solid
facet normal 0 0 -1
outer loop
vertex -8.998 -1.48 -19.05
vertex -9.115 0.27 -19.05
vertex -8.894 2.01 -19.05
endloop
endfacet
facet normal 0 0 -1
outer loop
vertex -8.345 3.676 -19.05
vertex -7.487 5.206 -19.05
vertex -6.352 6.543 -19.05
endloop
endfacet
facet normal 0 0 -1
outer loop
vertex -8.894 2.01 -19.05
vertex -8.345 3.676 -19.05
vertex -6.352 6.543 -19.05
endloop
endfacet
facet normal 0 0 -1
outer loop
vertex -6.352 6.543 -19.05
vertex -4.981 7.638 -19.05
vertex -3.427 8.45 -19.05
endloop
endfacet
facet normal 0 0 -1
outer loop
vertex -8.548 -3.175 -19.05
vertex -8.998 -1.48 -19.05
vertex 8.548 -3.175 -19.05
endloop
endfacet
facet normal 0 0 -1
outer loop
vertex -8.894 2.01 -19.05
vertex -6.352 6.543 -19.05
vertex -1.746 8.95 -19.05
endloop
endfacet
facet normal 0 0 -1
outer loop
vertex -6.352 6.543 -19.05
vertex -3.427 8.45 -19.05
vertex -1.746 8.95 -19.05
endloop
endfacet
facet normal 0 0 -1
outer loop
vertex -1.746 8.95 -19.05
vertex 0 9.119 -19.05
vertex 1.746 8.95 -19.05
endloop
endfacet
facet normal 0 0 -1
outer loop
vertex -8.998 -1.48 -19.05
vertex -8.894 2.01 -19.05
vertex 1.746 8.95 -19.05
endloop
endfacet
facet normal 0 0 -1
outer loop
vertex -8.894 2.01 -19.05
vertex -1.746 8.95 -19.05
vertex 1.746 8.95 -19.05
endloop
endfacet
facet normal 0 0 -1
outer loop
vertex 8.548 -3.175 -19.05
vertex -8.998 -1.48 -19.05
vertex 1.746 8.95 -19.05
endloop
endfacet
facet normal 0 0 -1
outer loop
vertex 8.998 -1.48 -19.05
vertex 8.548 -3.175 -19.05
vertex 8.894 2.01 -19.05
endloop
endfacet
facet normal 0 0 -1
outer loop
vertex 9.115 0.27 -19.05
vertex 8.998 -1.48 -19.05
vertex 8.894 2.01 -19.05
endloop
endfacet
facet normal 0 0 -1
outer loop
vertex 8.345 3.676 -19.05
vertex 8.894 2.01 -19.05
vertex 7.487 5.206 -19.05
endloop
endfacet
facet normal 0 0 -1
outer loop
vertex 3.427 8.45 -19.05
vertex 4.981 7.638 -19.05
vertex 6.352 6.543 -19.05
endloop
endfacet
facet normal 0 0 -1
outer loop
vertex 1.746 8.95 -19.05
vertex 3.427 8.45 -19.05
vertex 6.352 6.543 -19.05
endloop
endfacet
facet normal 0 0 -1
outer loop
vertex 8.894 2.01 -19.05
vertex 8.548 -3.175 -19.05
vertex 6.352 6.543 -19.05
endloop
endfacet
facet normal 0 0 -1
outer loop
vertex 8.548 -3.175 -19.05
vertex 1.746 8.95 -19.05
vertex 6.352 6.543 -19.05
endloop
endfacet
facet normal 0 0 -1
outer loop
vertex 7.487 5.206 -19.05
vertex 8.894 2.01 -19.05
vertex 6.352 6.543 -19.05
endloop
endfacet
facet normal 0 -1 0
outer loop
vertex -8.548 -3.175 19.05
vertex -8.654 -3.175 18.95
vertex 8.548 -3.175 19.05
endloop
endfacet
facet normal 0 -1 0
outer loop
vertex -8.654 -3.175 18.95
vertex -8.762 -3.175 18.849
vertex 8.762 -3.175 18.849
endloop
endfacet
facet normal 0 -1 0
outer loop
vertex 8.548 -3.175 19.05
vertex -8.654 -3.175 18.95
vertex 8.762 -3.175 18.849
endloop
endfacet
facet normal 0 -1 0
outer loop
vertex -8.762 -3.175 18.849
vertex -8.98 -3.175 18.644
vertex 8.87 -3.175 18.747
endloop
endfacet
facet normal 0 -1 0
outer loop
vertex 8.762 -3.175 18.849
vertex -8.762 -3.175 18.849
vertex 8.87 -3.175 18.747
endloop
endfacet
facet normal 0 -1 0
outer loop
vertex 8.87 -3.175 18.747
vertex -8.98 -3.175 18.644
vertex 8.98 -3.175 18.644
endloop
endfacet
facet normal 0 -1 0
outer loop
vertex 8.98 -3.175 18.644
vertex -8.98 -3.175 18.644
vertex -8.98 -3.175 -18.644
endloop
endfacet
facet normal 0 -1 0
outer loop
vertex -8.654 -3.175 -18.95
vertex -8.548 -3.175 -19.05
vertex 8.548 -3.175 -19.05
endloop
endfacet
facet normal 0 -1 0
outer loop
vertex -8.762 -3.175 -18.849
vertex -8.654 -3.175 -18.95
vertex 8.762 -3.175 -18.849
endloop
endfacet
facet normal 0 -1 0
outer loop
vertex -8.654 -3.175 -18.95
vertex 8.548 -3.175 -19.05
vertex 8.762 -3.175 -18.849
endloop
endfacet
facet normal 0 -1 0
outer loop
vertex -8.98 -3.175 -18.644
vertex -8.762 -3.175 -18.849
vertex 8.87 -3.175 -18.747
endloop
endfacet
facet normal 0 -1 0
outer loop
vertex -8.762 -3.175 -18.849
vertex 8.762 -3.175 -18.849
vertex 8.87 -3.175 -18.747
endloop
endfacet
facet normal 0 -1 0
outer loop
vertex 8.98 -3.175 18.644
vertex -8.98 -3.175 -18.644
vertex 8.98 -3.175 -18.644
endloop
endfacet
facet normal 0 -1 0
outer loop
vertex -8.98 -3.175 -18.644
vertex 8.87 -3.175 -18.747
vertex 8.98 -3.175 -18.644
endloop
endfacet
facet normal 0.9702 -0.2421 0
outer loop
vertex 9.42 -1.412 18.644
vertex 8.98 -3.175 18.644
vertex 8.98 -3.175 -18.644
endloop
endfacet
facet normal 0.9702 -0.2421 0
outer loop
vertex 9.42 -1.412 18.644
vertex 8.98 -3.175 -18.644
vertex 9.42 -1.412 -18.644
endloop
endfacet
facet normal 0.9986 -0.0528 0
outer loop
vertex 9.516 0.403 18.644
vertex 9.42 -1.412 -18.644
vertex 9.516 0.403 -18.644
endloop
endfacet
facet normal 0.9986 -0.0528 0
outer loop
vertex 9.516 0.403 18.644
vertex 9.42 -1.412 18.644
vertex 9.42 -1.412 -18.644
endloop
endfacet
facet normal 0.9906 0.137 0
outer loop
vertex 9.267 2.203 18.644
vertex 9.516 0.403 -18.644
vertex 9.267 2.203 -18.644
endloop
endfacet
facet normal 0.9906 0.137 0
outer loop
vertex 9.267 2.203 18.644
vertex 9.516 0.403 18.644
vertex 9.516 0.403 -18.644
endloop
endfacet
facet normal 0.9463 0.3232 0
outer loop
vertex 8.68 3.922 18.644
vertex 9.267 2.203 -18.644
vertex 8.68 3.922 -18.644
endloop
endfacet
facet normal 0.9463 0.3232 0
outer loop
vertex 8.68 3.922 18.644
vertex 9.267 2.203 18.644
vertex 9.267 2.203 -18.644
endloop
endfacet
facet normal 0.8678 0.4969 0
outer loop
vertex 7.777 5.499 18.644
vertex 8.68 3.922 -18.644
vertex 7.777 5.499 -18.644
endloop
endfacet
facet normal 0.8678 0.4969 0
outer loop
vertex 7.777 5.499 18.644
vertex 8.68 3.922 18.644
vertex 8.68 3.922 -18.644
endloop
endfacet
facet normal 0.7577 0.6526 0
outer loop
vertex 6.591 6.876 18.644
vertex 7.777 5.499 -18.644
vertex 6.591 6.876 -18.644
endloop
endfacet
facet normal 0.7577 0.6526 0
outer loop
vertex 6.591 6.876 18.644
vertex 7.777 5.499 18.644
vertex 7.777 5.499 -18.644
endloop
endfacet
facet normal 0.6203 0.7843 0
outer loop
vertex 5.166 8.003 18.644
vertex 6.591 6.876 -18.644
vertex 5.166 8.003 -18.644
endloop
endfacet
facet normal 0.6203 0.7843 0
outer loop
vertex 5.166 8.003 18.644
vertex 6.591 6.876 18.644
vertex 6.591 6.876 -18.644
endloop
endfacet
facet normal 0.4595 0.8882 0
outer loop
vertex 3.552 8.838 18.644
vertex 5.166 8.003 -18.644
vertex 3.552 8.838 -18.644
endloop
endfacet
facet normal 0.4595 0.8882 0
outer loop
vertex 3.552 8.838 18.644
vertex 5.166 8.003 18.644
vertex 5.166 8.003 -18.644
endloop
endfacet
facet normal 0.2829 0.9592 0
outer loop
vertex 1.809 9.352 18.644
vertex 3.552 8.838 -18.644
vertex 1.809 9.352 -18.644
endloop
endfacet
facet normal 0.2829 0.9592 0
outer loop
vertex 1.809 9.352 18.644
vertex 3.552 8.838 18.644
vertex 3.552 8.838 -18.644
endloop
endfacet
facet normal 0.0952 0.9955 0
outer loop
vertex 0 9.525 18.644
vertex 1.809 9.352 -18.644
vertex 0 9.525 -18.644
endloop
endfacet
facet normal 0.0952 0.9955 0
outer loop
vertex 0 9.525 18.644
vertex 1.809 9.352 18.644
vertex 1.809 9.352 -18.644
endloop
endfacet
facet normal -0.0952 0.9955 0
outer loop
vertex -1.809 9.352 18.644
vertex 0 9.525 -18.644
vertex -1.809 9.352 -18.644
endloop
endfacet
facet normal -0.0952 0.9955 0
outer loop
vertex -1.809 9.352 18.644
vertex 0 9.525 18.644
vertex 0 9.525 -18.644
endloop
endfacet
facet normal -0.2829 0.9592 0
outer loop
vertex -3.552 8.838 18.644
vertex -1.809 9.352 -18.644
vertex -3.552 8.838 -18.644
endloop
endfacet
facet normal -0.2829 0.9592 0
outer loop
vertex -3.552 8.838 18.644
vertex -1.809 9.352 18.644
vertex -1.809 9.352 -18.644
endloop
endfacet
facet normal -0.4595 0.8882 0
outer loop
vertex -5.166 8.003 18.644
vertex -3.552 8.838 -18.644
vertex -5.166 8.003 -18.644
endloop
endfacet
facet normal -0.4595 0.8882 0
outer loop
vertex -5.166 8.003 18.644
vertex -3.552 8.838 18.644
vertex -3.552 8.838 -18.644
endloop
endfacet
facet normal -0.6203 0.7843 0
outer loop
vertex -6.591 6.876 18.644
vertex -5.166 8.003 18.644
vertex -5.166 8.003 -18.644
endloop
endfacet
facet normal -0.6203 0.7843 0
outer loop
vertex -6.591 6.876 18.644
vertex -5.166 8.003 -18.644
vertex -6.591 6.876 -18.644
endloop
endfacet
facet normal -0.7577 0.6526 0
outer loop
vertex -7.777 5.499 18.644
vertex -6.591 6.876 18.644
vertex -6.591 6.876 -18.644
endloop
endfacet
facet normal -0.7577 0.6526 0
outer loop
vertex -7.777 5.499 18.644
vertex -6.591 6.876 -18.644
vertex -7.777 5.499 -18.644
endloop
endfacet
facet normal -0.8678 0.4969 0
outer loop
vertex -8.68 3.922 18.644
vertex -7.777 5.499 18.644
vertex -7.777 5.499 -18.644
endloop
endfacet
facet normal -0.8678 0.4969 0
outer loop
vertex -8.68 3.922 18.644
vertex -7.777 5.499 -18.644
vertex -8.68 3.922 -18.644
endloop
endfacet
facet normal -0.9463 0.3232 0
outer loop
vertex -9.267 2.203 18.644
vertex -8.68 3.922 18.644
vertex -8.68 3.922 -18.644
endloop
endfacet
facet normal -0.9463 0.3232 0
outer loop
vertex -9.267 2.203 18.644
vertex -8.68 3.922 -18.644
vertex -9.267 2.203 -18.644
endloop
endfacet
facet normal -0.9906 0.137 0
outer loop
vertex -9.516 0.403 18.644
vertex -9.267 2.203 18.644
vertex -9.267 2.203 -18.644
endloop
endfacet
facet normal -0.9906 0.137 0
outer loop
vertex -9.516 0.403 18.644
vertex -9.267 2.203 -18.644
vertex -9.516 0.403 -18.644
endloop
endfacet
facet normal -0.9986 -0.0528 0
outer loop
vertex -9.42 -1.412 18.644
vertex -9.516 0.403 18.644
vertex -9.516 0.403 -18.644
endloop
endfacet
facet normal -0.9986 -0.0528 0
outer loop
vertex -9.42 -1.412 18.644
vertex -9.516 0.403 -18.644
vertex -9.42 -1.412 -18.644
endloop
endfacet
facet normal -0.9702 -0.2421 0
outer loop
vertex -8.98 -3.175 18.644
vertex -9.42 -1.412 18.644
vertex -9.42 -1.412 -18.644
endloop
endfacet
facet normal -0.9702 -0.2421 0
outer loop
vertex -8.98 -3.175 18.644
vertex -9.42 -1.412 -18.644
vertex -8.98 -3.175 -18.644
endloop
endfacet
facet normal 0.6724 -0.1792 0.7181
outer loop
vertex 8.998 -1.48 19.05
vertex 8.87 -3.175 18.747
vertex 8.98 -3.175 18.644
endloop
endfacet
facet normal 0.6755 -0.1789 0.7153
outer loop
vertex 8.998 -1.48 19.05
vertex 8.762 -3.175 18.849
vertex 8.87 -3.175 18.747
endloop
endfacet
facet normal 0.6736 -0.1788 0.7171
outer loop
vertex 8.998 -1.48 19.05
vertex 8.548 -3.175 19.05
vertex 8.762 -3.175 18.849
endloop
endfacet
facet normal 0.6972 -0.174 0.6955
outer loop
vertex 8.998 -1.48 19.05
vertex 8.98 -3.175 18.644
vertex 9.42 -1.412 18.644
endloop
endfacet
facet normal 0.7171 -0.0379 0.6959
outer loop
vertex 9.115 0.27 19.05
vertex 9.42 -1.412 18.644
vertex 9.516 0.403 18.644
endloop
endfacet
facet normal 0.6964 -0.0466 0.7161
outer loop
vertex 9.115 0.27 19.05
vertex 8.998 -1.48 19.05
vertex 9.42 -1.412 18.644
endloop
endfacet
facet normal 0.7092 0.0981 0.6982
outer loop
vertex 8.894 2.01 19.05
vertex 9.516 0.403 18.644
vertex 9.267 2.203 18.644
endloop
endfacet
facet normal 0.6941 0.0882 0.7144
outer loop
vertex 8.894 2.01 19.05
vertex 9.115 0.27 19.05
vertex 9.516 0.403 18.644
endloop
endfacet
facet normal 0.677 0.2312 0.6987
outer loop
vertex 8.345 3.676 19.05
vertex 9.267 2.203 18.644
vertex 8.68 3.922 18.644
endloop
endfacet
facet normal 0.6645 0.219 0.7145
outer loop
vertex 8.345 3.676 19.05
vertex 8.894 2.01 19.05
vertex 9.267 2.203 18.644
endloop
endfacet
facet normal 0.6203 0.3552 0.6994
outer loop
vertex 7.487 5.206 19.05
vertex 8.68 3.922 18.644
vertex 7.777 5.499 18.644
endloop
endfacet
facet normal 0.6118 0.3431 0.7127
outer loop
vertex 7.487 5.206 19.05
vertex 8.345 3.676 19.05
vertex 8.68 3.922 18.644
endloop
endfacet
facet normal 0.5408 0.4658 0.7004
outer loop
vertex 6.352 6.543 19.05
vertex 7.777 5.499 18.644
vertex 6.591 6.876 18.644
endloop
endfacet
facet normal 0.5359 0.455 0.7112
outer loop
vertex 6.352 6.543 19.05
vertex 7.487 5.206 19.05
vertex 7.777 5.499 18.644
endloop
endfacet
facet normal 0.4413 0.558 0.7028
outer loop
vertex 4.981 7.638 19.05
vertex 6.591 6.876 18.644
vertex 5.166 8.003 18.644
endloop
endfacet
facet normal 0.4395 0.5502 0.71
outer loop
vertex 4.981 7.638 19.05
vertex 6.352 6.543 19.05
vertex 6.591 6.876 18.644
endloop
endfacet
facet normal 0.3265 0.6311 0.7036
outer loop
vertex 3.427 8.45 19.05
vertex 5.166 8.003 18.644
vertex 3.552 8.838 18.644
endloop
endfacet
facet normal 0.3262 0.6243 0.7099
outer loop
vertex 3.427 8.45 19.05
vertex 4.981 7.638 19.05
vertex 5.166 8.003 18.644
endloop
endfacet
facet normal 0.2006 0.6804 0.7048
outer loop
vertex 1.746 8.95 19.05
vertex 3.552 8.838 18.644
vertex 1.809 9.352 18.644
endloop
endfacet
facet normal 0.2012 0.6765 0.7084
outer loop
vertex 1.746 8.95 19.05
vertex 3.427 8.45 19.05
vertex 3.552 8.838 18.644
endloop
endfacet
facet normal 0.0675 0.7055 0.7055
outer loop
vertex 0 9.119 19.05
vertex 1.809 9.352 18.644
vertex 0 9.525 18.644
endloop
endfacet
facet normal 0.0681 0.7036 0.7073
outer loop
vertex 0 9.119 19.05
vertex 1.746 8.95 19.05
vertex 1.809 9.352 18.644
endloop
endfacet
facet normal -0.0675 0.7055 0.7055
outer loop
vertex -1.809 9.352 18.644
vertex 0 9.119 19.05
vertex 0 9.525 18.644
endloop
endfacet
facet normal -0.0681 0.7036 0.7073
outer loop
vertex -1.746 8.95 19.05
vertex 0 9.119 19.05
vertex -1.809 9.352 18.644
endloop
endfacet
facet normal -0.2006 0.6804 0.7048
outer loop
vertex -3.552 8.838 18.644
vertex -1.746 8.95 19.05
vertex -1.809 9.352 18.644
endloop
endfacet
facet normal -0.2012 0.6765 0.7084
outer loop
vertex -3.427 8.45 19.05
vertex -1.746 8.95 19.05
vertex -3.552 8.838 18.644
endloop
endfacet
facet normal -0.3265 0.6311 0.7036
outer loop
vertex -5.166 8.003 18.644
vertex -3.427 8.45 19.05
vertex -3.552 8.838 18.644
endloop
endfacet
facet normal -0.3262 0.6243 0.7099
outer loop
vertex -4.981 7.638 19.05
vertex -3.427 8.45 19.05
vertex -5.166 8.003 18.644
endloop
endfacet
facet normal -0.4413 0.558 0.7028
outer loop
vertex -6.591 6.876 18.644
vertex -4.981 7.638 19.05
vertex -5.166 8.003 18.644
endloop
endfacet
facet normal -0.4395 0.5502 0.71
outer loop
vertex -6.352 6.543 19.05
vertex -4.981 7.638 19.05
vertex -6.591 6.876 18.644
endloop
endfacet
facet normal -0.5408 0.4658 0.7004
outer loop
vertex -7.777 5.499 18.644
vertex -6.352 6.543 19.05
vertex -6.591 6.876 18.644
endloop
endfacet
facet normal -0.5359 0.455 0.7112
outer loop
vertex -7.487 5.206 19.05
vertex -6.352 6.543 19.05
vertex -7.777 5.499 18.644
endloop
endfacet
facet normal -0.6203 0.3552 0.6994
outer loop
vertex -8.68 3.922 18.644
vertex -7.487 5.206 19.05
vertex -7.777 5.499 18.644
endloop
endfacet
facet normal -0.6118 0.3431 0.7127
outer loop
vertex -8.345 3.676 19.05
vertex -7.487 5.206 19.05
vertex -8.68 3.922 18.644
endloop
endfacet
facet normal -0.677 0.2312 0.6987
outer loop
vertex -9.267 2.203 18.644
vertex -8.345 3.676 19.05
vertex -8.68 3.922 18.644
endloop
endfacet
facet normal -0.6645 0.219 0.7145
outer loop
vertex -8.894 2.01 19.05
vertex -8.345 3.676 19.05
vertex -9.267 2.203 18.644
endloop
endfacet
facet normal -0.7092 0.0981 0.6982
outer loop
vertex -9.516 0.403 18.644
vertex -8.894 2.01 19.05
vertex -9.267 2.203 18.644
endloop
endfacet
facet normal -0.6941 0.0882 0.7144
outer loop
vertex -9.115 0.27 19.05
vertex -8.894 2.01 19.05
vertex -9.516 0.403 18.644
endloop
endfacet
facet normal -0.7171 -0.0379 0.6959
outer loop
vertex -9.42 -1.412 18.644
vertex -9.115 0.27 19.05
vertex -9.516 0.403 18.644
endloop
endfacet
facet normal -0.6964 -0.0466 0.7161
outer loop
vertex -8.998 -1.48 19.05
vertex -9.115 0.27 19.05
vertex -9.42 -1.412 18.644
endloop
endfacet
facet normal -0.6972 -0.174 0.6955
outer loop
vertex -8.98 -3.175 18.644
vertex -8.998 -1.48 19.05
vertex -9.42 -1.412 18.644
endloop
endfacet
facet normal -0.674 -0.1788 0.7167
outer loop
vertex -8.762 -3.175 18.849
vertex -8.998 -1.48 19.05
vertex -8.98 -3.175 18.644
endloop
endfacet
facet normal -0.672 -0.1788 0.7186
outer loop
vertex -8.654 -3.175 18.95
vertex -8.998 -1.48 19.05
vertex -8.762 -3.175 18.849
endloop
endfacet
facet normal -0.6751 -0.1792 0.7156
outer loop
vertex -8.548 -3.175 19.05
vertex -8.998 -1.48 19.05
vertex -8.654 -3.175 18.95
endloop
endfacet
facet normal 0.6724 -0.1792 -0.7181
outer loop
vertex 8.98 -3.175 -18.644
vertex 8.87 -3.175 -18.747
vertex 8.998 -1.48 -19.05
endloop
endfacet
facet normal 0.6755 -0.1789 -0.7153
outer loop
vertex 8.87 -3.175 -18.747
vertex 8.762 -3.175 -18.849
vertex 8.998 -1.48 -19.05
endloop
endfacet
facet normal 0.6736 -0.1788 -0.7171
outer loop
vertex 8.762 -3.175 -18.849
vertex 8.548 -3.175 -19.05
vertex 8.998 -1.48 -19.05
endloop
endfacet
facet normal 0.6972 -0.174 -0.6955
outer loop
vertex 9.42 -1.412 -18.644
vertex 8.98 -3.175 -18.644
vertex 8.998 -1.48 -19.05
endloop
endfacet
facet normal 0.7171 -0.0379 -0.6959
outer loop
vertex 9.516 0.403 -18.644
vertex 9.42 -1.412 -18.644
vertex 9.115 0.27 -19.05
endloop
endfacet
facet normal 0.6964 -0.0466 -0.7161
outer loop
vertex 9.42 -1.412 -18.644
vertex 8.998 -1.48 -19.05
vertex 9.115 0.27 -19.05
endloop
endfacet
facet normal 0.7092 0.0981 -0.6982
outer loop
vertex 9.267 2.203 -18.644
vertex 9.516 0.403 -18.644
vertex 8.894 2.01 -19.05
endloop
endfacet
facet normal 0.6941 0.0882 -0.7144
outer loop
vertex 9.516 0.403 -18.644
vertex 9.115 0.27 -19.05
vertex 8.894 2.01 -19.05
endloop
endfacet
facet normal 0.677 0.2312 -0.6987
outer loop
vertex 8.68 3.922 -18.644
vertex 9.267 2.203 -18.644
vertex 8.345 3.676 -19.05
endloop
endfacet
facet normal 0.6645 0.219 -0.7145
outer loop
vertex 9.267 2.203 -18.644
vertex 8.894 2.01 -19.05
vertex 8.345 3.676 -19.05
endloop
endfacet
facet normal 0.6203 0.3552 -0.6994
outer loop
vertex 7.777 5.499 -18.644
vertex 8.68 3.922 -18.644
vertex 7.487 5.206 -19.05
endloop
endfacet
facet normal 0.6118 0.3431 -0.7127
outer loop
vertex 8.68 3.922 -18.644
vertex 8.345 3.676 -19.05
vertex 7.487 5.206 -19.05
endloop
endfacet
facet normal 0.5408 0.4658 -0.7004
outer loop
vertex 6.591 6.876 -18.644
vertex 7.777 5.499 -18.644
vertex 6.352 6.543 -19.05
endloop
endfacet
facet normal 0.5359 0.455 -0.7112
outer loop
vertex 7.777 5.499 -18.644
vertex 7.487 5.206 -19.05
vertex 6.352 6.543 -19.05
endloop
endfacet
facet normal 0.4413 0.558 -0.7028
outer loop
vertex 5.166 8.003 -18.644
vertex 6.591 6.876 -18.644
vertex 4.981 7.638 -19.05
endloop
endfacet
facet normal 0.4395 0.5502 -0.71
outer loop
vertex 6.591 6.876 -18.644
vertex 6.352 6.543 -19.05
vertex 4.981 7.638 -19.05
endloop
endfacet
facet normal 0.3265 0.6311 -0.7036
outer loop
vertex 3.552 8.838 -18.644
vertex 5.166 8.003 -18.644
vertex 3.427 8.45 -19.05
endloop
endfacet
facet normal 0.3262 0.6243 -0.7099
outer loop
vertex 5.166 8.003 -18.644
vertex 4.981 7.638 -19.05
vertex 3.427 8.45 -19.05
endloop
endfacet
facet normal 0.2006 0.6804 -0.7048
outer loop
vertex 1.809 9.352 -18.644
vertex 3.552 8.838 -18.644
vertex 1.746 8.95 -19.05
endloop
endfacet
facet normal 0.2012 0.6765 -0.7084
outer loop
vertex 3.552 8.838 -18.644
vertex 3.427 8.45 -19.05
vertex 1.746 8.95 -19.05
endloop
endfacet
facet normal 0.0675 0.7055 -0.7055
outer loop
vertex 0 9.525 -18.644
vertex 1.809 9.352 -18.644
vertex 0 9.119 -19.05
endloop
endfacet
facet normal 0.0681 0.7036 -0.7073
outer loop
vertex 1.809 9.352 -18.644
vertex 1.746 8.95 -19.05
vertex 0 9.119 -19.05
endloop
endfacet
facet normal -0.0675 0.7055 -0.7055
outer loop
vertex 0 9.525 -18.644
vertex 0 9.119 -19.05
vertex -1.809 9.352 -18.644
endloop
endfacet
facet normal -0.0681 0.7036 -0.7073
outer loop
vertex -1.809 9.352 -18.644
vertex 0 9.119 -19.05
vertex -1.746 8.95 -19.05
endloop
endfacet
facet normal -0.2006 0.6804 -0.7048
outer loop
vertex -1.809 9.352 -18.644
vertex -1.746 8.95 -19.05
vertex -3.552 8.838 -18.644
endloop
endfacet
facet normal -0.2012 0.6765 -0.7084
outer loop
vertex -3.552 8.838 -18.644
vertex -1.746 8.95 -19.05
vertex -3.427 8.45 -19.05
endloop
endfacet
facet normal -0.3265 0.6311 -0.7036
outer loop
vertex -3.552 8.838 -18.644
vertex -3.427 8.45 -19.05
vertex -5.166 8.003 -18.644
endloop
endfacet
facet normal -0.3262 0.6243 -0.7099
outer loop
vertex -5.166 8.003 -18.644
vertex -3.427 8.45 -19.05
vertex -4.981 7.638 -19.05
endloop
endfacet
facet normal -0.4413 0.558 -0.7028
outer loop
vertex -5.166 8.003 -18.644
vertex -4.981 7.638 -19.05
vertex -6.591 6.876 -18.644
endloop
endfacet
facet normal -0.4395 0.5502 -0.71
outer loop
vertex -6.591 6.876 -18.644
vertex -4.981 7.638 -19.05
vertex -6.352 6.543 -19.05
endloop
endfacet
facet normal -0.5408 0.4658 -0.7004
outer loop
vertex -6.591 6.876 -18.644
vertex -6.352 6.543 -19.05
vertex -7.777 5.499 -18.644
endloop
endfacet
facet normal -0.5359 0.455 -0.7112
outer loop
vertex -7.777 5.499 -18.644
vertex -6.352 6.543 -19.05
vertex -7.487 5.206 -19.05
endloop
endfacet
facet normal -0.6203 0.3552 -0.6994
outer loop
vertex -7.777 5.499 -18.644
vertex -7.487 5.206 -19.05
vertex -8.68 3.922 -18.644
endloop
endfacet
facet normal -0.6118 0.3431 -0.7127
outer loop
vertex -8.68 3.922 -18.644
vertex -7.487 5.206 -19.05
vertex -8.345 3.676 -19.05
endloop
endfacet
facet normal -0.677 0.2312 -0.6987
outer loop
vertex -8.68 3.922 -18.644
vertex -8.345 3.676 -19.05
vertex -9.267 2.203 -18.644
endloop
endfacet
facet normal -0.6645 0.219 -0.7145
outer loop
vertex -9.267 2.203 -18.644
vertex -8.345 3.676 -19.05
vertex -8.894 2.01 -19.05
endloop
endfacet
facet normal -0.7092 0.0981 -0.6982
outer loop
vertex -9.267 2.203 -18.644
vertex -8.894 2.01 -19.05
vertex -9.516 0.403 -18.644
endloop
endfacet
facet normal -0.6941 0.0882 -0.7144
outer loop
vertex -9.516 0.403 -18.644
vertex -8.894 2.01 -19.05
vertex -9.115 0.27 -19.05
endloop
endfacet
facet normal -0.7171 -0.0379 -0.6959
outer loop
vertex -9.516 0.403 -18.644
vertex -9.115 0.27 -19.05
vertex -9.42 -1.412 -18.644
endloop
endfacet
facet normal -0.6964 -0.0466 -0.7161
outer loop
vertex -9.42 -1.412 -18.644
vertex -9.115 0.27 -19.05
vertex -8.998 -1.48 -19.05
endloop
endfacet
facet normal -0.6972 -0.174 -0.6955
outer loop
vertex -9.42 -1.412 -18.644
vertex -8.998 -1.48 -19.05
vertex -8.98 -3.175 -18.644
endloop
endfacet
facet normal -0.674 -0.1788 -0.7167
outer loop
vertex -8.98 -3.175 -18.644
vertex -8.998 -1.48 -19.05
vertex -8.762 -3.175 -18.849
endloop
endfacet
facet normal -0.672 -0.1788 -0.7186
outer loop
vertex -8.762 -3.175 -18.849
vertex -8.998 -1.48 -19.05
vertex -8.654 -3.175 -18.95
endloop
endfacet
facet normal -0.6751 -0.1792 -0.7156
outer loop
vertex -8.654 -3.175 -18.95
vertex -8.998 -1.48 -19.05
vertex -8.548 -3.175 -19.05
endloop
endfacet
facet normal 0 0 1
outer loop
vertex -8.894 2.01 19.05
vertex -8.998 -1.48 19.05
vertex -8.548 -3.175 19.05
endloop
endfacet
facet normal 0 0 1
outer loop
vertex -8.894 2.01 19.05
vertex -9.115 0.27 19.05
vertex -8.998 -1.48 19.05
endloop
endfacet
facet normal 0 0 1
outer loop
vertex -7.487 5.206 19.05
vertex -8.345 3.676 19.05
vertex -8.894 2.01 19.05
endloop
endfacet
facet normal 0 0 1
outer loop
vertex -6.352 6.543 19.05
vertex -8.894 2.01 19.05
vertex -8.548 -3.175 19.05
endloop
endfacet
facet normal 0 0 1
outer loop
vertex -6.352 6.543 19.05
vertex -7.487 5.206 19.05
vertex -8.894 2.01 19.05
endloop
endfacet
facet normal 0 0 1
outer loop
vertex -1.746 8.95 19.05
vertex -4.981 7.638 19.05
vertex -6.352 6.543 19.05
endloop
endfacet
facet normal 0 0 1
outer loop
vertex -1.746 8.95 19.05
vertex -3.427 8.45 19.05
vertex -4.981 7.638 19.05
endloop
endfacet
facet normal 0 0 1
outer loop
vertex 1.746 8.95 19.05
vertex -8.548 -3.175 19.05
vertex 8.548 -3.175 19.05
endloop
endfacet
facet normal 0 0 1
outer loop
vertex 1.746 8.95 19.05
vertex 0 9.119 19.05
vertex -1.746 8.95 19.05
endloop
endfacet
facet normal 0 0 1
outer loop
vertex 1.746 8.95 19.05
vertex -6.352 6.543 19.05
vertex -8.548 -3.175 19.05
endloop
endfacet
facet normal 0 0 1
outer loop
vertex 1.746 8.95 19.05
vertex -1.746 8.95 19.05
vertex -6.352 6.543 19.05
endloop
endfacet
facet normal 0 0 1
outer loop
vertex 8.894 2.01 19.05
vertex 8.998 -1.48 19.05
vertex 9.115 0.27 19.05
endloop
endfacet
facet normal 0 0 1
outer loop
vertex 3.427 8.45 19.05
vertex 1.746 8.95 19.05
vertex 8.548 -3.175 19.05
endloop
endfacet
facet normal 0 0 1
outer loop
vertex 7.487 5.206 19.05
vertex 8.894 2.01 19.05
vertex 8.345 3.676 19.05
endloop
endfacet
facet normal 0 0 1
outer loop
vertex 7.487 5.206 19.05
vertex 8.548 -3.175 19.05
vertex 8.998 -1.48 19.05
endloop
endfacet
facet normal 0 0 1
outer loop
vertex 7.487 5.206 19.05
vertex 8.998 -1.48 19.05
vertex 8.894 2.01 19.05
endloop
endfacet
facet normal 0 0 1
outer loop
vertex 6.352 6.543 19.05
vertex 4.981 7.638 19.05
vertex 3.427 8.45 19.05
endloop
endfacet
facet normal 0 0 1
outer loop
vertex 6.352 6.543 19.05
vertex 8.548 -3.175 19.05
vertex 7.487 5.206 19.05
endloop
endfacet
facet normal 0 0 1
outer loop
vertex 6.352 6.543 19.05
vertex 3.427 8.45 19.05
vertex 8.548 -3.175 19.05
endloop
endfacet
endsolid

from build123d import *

# Parameters (mm, degrees)
SKETCH1_R            = 9.525
EXTRUDE1_DEPTH       = 19.05
CHAMFER1_SIZE        = 0.4064
TRUNCATED_DEPTH      = 20.05
TRUNCATED_DEPTH_BACK = 20.05


with BuildPart() as part:
    # Sketch1 → Extrude1 (new body, symmetric)
    with BuildSketch(Plane.XY):
        Circle(SKETCH1_R)
    extrude(amount=EXTRUDE1_DEPTH, both=True)

    # Chamfer1
    chamfer1_edges = [part.edges().sort_by_distance(p)[0] for p in [
        (-9.525, 0, -19.05),
        (-9.525, 0, 19.05),
    ]]
    chamfer(chamfer1_edges, length=CHAMFER1_SIZE)

    # Sketch2 → Truncated (cut, two sides)
    with BuildSketch(Plane.XY) as truncated_sk:
        with BuildLine():
            Line((-8.980256121, -3.175), (8.980256121, -3.175))
            ThreePointArc((8.980256121, -3.175), (0, -9.525), (-8.980256121, -3.175))
        make_face()
    extrude(amount=TRUNCATED_DEPTH, mode=Mode.SUBTRACT)
    extrude(truncated_sk.sketch, amount=-TRUNCATED_DEPTH_BACK, mode=Mode.SUBTRACT)


solid = part.part
